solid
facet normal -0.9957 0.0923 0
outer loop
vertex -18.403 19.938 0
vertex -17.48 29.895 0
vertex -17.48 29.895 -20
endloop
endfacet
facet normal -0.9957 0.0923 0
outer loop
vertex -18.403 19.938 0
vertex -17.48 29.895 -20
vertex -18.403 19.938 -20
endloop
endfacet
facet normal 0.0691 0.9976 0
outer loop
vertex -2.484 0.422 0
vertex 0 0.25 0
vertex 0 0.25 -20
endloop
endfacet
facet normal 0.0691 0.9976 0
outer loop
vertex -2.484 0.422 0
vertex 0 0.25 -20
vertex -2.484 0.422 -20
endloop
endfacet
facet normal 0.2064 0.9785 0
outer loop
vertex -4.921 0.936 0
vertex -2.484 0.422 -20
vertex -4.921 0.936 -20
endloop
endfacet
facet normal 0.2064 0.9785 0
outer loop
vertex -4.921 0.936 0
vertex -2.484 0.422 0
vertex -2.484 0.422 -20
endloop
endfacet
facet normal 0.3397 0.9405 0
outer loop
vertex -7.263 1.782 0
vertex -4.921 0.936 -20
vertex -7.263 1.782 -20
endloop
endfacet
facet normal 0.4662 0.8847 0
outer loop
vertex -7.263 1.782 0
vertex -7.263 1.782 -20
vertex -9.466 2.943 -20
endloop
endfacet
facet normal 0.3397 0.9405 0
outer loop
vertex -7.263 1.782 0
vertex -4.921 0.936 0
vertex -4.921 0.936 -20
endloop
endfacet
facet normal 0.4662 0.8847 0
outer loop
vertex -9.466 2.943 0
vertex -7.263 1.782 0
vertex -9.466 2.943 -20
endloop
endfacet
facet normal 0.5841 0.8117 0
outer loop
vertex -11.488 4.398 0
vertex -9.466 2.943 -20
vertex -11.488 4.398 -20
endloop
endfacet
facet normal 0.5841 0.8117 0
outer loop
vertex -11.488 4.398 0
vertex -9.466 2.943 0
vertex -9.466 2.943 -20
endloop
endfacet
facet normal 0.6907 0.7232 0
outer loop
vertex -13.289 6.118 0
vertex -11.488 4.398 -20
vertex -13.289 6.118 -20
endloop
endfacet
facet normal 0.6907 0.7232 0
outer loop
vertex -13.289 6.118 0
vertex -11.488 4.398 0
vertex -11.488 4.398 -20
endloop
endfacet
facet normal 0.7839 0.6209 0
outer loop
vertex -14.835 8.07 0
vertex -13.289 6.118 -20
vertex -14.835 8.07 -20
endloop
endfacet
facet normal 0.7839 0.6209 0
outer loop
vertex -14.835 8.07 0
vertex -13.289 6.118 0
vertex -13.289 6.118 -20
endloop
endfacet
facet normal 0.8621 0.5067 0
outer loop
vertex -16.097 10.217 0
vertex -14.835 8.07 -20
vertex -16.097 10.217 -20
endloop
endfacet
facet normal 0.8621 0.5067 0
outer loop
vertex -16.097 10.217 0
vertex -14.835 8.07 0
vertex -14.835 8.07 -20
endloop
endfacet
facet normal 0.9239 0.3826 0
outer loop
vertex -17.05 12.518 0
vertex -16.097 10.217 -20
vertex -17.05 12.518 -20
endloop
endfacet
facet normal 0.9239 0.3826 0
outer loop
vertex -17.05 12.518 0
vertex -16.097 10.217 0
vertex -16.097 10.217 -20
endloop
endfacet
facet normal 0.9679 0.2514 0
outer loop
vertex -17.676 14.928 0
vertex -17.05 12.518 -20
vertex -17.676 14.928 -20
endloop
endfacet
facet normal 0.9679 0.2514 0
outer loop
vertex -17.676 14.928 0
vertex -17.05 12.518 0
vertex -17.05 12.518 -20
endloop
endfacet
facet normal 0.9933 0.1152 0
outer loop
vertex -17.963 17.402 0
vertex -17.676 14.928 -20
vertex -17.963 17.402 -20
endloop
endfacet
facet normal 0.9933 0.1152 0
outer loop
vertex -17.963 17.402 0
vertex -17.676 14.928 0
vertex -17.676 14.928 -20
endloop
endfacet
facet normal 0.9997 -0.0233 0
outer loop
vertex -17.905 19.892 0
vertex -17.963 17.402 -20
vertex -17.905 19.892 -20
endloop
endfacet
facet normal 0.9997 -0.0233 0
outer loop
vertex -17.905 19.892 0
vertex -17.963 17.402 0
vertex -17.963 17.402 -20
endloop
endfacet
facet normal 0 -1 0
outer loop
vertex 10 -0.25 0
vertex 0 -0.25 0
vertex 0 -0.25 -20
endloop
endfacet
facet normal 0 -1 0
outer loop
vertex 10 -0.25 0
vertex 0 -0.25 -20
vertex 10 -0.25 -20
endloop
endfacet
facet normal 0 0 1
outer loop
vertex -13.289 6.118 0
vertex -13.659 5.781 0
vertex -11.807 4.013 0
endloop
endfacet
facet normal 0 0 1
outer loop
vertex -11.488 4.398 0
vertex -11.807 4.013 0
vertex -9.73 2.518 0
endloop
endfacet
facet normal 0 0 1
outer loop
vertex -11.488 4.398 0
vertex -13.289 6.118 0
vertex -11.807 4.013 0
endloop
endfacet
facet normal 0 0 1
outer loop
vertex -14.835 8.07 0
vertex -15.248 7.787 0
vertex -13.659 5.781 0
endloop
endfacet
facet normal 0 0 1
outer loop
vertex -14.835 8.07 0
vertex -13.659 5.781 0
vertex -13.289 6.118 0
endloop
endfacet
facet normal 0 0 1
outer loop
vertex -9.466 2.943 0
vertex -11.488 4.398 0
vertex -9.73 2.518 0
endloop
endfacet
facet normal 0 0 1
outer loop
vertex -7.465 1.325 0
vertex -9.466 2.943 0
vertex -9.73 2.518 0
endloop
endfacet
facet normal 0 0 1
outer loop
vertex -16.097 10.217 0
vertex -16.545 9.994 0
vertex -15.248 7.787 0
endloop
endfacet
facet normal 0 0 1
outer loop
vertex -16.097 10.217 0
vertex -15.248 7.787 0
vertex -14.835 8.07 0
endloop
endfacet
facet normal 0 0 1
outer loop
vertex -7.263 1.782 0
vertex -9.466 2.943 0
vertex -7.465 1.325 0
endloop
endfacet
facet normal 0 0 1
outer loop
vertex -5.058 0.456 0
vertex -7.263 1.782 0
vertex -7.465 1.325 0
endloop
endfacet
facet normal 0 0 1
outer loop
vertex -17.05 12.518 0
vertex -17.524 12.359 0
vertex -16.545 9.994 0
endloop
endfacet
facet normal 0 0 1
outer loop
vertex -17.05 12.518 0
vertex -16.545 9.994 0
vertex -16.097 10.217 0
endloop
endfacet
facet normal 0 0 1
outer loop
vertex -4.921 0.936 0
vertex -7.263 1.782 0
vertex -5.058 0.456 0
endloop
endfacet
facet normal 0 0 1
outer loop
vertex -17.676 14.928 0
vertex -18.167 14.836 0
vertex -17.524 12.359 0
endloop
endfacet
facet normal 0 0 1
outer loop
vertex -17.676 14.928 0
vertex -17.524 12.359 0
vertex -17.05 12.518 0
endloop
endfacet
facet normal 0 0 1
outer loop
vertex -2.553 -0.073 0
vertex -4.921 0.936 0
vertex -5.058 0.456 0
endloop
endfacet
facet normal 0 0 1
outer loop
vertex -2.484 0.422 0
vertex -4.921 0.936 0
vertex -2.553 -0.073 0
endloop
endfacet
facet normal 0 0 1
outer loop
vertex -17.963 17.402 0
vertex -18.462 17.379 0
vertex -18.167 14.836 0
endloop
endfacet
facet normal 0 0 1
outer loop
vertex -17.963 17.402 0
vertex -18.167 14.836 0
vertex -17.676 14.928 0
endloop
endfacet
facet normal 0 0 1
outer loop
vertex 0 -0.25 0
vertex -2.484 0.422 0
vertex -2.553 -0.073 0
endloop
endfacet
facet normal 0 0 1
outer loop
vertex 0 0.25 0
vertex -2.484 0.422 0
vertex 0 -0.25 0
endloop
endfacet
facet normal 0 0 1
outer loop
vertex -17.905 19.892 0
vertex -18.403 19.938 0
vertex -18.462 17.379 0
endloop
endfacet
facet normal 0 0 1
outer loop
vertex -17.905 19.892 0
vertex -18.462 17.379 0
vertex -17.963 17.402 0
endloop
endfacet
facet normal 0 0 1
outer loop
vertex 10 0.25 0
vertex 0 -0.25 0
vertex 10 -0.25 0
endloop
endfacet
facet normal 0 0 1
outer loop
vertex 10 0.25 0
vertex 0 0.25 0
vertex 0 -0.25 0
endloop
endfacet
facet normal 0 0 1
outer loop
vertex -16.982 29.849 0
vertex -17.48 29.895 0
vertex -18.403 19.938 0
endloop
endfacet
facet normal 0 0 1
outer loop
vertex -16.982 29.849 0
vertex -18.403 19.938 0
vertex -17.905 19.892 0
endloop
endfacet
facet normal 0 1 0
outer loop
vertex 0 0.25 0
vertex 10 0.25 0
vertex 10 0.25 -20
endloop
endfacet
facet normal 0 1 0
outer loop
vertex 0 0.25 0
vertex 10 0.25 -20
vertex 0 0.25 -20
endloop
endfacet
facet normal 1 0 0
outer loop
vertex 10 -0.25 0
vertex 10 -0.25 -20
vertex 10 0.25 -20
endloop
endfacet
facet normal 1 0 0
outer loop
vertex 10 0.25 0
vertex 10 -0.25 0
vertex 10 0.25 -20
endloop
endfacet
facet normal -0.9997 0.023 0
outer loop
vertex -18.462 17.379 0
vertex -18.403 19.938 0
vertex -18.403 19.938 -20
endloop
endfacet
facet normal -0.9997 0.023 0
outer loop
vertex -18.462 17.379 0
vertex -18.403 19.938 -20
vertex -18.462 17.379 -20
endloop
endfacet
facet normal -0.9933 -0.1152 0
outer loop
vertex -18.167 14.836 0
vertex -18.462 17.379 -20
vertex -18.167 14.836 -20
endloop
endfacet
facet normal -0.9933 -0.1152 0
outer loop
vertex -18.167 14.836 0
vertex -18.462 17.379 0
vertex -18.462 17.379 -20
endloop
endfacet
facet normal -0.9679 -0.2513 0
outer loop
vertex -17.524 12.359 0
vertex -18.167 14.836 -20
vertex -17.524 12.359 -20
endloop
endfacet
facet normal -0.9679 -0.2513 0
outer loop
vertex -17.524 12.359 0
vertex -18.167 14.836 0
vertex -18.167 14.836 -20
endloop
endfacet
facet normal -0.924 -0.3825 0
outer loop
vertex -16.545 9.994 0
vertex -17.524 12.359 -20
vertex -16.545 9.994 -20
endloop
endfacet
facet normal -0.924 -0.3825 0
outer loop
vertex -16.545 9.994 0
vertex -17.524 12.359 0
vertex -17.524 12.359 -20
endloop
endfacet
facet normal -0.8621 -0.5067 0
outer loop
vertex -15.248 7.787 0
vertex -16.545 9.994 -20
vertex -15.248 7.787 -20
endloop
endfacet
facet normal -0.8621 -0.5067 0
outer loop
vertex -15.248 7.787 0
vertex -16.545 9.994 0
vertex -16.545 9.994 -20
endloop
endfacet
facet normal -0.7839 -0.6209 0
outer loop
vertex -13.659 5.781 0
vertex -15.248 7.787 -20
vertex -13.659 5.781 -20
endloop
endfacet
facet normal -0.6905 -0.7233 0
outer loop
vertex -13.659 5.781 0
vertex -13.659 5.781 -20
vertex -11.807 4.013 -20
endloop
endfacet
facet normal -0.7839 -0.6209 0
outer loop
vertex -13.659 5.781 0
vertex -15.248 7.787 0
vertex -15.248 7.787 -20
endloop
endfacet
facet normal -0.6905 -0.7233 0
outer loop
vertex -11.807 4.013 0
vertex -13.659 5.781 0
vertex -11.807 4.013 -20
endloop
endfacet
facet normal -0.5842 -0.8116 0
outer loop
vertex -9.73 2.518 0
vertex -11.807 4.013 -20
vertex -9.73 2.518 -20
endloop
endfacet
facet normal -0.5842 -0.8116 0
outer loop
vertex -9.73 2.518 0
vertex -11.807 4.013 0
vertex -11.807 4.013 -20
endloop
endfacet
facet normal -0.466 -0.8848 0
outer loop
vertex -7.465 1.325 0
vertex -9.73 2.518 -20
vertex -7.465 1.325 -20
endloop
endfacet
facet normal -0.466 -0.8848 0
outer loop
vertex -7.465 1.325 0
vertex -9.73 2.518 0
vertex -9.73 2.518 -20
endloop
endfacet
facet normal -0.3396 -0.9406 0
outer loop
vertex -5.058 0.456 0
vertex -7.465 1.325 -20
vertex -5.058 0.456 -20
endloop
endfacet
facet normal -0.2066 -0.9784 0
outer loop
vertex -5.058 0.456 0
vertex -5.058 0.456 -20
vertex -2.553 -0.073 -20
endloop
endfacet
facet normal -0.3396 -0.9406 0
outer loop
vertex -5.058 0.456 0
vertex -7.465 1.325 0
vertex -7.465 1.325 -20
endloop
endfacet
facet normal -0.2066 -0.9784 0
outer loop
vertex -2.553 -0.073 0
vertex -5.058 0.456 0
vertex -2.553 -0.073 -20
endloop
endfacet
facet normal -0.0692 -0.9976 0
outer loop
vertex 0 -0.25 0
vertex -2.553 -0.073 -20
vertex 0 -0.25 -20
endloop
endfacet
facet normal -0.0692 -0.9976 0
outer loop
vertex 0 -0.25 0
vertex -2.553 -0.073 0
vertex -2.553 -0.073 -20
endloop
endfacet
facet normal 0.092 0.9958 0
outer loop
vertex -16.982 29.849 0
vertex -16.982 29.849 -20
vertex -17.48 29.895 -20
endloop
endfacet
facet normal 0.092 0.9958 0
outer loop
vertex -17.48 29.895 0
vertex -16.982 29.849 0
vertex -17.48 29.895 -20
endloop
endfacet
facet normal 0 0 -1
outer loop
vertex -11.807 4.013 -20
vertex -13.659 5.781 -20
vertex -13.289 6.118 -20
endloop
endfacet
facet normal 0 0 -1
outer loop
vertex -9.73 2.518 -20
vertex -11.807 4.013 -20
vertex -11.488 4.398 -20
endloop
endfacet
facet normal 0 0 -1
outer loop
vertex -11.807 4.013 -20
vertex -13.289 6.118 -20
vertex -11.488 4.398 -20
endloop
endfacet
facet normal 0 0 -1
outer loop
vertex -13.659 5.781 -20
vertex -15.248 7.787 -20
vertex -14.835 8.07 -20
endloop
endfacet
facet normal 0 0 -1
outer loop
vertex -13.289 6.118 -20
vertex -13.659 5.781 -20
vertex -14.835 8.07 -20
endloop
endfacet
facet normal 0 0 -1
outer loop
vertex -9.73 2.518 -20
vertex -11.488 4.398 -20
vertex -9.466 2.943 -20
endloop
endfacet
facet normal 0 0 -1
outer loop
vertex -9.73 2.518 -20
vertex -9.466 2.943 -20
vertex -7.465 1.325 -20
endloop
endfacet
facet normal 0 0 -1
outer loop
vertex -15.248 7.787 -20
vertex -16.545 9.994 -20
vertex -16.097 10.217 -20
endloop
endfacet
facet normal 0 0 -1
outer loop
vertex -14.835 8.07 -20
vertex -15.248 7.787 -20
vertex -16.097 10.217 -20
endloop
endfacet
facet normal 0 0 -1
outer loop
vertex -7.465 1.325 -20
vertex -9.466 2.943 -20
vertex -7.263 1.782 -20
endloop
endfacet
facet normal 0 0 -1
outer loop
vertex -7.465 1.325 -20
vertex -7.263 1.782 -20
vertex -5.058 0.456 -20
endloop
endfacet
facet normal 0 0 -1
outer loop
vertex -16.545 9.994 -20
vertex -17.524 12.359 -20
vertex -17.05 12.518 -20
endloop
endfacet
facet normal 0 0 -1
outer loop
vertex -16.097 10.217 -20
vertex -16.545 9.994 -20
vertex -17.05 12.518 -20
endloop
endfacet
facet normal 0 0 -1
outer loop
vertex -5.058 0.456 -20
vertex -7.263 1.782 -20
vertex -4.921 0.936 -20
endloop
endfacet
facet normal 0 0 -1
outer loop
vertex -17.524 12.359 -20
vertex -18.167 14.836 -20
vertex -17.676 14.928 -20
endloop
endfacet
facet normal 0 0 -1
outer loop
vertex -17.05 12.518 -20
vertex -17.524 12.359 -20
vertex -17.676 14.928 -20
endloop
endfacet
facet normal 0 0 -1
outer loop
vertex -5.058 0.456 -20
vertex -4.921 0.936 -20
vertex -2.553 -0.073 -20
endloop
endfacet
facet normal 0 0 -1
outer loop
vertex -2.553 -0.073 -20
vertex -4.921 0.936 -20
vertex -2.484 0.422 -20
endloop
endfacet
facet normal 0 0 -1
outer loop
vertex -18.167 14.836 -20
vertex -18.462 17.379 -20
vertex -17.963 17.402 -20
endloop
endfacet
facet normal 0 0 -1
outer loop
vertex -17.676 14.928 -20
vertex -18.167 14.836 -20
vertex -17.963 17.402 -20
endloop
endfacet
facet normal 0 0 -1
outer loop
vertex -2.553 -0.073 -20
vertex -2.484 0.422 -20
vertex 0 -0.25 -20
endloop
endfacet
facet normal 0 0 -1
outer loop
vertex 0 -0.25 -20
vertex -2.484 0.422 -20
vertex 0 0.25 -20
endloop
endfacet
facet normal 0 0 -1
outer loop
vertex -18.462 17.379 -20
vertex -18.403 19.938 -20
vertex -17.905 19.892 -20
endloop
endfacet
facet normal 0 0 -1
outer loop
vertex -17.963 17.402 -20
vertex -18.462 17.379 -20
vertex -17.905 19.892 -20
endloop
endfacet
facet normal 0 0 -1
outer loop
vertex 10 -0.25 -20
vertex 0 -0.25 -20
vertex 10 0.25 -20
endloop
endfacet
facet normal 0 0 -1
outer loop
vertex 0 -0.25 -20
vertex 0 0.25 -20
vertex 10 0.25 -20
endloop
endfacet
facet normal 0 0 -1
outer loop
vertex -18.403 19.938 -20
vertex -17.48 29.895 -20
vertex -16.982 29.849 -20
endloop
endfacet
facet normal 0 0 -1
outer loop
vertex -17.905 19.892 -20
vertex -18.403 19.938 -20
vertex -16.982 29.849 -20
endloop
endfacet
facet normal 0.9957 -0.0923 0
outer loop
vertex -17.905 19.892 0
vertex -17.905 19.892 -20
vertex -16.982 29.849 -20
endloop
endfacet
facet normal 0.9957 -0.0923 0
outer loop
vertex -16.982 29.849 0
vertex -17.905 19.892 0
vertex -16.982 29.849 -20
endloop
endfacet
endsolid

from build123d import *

# Parameters (mm, degrees)
BOSS_EXTRUDE1_DEPTH = 20


with BuildPart() as part:
    # Sketch1 → Boss-Extrude1 (new body)
    with BuildSketch(Plane.XY):
        with BuildLine():
            Line((10, -0.25), (10, 0.25))
            Line((10, 0.25), (0, 0.25))
            ThreePointArc((0, 0.25), (-13.289004078, 6.117752441), (-17.905282596, 19.891572562))
            Line((-17.905282596, 19.891572562), (-16.982390424, 29.848894995))
            Line((-16.982390424, 29.848894995), (-17.480256546, 29.895039604))
            Line((-17.480256546, 29.895039604), (-18.403148718, 19.937717171))
            ThreePointArc((-18.403148718, 19.937717171), (-13.658512065, 5.780908489), (0, -0.25))
            Line((0, -0.25), (10, -0.25))
        make_face()
    extrude(amount=-BOSS_EXTRUDE1_DEPTH)


solid = part.part
